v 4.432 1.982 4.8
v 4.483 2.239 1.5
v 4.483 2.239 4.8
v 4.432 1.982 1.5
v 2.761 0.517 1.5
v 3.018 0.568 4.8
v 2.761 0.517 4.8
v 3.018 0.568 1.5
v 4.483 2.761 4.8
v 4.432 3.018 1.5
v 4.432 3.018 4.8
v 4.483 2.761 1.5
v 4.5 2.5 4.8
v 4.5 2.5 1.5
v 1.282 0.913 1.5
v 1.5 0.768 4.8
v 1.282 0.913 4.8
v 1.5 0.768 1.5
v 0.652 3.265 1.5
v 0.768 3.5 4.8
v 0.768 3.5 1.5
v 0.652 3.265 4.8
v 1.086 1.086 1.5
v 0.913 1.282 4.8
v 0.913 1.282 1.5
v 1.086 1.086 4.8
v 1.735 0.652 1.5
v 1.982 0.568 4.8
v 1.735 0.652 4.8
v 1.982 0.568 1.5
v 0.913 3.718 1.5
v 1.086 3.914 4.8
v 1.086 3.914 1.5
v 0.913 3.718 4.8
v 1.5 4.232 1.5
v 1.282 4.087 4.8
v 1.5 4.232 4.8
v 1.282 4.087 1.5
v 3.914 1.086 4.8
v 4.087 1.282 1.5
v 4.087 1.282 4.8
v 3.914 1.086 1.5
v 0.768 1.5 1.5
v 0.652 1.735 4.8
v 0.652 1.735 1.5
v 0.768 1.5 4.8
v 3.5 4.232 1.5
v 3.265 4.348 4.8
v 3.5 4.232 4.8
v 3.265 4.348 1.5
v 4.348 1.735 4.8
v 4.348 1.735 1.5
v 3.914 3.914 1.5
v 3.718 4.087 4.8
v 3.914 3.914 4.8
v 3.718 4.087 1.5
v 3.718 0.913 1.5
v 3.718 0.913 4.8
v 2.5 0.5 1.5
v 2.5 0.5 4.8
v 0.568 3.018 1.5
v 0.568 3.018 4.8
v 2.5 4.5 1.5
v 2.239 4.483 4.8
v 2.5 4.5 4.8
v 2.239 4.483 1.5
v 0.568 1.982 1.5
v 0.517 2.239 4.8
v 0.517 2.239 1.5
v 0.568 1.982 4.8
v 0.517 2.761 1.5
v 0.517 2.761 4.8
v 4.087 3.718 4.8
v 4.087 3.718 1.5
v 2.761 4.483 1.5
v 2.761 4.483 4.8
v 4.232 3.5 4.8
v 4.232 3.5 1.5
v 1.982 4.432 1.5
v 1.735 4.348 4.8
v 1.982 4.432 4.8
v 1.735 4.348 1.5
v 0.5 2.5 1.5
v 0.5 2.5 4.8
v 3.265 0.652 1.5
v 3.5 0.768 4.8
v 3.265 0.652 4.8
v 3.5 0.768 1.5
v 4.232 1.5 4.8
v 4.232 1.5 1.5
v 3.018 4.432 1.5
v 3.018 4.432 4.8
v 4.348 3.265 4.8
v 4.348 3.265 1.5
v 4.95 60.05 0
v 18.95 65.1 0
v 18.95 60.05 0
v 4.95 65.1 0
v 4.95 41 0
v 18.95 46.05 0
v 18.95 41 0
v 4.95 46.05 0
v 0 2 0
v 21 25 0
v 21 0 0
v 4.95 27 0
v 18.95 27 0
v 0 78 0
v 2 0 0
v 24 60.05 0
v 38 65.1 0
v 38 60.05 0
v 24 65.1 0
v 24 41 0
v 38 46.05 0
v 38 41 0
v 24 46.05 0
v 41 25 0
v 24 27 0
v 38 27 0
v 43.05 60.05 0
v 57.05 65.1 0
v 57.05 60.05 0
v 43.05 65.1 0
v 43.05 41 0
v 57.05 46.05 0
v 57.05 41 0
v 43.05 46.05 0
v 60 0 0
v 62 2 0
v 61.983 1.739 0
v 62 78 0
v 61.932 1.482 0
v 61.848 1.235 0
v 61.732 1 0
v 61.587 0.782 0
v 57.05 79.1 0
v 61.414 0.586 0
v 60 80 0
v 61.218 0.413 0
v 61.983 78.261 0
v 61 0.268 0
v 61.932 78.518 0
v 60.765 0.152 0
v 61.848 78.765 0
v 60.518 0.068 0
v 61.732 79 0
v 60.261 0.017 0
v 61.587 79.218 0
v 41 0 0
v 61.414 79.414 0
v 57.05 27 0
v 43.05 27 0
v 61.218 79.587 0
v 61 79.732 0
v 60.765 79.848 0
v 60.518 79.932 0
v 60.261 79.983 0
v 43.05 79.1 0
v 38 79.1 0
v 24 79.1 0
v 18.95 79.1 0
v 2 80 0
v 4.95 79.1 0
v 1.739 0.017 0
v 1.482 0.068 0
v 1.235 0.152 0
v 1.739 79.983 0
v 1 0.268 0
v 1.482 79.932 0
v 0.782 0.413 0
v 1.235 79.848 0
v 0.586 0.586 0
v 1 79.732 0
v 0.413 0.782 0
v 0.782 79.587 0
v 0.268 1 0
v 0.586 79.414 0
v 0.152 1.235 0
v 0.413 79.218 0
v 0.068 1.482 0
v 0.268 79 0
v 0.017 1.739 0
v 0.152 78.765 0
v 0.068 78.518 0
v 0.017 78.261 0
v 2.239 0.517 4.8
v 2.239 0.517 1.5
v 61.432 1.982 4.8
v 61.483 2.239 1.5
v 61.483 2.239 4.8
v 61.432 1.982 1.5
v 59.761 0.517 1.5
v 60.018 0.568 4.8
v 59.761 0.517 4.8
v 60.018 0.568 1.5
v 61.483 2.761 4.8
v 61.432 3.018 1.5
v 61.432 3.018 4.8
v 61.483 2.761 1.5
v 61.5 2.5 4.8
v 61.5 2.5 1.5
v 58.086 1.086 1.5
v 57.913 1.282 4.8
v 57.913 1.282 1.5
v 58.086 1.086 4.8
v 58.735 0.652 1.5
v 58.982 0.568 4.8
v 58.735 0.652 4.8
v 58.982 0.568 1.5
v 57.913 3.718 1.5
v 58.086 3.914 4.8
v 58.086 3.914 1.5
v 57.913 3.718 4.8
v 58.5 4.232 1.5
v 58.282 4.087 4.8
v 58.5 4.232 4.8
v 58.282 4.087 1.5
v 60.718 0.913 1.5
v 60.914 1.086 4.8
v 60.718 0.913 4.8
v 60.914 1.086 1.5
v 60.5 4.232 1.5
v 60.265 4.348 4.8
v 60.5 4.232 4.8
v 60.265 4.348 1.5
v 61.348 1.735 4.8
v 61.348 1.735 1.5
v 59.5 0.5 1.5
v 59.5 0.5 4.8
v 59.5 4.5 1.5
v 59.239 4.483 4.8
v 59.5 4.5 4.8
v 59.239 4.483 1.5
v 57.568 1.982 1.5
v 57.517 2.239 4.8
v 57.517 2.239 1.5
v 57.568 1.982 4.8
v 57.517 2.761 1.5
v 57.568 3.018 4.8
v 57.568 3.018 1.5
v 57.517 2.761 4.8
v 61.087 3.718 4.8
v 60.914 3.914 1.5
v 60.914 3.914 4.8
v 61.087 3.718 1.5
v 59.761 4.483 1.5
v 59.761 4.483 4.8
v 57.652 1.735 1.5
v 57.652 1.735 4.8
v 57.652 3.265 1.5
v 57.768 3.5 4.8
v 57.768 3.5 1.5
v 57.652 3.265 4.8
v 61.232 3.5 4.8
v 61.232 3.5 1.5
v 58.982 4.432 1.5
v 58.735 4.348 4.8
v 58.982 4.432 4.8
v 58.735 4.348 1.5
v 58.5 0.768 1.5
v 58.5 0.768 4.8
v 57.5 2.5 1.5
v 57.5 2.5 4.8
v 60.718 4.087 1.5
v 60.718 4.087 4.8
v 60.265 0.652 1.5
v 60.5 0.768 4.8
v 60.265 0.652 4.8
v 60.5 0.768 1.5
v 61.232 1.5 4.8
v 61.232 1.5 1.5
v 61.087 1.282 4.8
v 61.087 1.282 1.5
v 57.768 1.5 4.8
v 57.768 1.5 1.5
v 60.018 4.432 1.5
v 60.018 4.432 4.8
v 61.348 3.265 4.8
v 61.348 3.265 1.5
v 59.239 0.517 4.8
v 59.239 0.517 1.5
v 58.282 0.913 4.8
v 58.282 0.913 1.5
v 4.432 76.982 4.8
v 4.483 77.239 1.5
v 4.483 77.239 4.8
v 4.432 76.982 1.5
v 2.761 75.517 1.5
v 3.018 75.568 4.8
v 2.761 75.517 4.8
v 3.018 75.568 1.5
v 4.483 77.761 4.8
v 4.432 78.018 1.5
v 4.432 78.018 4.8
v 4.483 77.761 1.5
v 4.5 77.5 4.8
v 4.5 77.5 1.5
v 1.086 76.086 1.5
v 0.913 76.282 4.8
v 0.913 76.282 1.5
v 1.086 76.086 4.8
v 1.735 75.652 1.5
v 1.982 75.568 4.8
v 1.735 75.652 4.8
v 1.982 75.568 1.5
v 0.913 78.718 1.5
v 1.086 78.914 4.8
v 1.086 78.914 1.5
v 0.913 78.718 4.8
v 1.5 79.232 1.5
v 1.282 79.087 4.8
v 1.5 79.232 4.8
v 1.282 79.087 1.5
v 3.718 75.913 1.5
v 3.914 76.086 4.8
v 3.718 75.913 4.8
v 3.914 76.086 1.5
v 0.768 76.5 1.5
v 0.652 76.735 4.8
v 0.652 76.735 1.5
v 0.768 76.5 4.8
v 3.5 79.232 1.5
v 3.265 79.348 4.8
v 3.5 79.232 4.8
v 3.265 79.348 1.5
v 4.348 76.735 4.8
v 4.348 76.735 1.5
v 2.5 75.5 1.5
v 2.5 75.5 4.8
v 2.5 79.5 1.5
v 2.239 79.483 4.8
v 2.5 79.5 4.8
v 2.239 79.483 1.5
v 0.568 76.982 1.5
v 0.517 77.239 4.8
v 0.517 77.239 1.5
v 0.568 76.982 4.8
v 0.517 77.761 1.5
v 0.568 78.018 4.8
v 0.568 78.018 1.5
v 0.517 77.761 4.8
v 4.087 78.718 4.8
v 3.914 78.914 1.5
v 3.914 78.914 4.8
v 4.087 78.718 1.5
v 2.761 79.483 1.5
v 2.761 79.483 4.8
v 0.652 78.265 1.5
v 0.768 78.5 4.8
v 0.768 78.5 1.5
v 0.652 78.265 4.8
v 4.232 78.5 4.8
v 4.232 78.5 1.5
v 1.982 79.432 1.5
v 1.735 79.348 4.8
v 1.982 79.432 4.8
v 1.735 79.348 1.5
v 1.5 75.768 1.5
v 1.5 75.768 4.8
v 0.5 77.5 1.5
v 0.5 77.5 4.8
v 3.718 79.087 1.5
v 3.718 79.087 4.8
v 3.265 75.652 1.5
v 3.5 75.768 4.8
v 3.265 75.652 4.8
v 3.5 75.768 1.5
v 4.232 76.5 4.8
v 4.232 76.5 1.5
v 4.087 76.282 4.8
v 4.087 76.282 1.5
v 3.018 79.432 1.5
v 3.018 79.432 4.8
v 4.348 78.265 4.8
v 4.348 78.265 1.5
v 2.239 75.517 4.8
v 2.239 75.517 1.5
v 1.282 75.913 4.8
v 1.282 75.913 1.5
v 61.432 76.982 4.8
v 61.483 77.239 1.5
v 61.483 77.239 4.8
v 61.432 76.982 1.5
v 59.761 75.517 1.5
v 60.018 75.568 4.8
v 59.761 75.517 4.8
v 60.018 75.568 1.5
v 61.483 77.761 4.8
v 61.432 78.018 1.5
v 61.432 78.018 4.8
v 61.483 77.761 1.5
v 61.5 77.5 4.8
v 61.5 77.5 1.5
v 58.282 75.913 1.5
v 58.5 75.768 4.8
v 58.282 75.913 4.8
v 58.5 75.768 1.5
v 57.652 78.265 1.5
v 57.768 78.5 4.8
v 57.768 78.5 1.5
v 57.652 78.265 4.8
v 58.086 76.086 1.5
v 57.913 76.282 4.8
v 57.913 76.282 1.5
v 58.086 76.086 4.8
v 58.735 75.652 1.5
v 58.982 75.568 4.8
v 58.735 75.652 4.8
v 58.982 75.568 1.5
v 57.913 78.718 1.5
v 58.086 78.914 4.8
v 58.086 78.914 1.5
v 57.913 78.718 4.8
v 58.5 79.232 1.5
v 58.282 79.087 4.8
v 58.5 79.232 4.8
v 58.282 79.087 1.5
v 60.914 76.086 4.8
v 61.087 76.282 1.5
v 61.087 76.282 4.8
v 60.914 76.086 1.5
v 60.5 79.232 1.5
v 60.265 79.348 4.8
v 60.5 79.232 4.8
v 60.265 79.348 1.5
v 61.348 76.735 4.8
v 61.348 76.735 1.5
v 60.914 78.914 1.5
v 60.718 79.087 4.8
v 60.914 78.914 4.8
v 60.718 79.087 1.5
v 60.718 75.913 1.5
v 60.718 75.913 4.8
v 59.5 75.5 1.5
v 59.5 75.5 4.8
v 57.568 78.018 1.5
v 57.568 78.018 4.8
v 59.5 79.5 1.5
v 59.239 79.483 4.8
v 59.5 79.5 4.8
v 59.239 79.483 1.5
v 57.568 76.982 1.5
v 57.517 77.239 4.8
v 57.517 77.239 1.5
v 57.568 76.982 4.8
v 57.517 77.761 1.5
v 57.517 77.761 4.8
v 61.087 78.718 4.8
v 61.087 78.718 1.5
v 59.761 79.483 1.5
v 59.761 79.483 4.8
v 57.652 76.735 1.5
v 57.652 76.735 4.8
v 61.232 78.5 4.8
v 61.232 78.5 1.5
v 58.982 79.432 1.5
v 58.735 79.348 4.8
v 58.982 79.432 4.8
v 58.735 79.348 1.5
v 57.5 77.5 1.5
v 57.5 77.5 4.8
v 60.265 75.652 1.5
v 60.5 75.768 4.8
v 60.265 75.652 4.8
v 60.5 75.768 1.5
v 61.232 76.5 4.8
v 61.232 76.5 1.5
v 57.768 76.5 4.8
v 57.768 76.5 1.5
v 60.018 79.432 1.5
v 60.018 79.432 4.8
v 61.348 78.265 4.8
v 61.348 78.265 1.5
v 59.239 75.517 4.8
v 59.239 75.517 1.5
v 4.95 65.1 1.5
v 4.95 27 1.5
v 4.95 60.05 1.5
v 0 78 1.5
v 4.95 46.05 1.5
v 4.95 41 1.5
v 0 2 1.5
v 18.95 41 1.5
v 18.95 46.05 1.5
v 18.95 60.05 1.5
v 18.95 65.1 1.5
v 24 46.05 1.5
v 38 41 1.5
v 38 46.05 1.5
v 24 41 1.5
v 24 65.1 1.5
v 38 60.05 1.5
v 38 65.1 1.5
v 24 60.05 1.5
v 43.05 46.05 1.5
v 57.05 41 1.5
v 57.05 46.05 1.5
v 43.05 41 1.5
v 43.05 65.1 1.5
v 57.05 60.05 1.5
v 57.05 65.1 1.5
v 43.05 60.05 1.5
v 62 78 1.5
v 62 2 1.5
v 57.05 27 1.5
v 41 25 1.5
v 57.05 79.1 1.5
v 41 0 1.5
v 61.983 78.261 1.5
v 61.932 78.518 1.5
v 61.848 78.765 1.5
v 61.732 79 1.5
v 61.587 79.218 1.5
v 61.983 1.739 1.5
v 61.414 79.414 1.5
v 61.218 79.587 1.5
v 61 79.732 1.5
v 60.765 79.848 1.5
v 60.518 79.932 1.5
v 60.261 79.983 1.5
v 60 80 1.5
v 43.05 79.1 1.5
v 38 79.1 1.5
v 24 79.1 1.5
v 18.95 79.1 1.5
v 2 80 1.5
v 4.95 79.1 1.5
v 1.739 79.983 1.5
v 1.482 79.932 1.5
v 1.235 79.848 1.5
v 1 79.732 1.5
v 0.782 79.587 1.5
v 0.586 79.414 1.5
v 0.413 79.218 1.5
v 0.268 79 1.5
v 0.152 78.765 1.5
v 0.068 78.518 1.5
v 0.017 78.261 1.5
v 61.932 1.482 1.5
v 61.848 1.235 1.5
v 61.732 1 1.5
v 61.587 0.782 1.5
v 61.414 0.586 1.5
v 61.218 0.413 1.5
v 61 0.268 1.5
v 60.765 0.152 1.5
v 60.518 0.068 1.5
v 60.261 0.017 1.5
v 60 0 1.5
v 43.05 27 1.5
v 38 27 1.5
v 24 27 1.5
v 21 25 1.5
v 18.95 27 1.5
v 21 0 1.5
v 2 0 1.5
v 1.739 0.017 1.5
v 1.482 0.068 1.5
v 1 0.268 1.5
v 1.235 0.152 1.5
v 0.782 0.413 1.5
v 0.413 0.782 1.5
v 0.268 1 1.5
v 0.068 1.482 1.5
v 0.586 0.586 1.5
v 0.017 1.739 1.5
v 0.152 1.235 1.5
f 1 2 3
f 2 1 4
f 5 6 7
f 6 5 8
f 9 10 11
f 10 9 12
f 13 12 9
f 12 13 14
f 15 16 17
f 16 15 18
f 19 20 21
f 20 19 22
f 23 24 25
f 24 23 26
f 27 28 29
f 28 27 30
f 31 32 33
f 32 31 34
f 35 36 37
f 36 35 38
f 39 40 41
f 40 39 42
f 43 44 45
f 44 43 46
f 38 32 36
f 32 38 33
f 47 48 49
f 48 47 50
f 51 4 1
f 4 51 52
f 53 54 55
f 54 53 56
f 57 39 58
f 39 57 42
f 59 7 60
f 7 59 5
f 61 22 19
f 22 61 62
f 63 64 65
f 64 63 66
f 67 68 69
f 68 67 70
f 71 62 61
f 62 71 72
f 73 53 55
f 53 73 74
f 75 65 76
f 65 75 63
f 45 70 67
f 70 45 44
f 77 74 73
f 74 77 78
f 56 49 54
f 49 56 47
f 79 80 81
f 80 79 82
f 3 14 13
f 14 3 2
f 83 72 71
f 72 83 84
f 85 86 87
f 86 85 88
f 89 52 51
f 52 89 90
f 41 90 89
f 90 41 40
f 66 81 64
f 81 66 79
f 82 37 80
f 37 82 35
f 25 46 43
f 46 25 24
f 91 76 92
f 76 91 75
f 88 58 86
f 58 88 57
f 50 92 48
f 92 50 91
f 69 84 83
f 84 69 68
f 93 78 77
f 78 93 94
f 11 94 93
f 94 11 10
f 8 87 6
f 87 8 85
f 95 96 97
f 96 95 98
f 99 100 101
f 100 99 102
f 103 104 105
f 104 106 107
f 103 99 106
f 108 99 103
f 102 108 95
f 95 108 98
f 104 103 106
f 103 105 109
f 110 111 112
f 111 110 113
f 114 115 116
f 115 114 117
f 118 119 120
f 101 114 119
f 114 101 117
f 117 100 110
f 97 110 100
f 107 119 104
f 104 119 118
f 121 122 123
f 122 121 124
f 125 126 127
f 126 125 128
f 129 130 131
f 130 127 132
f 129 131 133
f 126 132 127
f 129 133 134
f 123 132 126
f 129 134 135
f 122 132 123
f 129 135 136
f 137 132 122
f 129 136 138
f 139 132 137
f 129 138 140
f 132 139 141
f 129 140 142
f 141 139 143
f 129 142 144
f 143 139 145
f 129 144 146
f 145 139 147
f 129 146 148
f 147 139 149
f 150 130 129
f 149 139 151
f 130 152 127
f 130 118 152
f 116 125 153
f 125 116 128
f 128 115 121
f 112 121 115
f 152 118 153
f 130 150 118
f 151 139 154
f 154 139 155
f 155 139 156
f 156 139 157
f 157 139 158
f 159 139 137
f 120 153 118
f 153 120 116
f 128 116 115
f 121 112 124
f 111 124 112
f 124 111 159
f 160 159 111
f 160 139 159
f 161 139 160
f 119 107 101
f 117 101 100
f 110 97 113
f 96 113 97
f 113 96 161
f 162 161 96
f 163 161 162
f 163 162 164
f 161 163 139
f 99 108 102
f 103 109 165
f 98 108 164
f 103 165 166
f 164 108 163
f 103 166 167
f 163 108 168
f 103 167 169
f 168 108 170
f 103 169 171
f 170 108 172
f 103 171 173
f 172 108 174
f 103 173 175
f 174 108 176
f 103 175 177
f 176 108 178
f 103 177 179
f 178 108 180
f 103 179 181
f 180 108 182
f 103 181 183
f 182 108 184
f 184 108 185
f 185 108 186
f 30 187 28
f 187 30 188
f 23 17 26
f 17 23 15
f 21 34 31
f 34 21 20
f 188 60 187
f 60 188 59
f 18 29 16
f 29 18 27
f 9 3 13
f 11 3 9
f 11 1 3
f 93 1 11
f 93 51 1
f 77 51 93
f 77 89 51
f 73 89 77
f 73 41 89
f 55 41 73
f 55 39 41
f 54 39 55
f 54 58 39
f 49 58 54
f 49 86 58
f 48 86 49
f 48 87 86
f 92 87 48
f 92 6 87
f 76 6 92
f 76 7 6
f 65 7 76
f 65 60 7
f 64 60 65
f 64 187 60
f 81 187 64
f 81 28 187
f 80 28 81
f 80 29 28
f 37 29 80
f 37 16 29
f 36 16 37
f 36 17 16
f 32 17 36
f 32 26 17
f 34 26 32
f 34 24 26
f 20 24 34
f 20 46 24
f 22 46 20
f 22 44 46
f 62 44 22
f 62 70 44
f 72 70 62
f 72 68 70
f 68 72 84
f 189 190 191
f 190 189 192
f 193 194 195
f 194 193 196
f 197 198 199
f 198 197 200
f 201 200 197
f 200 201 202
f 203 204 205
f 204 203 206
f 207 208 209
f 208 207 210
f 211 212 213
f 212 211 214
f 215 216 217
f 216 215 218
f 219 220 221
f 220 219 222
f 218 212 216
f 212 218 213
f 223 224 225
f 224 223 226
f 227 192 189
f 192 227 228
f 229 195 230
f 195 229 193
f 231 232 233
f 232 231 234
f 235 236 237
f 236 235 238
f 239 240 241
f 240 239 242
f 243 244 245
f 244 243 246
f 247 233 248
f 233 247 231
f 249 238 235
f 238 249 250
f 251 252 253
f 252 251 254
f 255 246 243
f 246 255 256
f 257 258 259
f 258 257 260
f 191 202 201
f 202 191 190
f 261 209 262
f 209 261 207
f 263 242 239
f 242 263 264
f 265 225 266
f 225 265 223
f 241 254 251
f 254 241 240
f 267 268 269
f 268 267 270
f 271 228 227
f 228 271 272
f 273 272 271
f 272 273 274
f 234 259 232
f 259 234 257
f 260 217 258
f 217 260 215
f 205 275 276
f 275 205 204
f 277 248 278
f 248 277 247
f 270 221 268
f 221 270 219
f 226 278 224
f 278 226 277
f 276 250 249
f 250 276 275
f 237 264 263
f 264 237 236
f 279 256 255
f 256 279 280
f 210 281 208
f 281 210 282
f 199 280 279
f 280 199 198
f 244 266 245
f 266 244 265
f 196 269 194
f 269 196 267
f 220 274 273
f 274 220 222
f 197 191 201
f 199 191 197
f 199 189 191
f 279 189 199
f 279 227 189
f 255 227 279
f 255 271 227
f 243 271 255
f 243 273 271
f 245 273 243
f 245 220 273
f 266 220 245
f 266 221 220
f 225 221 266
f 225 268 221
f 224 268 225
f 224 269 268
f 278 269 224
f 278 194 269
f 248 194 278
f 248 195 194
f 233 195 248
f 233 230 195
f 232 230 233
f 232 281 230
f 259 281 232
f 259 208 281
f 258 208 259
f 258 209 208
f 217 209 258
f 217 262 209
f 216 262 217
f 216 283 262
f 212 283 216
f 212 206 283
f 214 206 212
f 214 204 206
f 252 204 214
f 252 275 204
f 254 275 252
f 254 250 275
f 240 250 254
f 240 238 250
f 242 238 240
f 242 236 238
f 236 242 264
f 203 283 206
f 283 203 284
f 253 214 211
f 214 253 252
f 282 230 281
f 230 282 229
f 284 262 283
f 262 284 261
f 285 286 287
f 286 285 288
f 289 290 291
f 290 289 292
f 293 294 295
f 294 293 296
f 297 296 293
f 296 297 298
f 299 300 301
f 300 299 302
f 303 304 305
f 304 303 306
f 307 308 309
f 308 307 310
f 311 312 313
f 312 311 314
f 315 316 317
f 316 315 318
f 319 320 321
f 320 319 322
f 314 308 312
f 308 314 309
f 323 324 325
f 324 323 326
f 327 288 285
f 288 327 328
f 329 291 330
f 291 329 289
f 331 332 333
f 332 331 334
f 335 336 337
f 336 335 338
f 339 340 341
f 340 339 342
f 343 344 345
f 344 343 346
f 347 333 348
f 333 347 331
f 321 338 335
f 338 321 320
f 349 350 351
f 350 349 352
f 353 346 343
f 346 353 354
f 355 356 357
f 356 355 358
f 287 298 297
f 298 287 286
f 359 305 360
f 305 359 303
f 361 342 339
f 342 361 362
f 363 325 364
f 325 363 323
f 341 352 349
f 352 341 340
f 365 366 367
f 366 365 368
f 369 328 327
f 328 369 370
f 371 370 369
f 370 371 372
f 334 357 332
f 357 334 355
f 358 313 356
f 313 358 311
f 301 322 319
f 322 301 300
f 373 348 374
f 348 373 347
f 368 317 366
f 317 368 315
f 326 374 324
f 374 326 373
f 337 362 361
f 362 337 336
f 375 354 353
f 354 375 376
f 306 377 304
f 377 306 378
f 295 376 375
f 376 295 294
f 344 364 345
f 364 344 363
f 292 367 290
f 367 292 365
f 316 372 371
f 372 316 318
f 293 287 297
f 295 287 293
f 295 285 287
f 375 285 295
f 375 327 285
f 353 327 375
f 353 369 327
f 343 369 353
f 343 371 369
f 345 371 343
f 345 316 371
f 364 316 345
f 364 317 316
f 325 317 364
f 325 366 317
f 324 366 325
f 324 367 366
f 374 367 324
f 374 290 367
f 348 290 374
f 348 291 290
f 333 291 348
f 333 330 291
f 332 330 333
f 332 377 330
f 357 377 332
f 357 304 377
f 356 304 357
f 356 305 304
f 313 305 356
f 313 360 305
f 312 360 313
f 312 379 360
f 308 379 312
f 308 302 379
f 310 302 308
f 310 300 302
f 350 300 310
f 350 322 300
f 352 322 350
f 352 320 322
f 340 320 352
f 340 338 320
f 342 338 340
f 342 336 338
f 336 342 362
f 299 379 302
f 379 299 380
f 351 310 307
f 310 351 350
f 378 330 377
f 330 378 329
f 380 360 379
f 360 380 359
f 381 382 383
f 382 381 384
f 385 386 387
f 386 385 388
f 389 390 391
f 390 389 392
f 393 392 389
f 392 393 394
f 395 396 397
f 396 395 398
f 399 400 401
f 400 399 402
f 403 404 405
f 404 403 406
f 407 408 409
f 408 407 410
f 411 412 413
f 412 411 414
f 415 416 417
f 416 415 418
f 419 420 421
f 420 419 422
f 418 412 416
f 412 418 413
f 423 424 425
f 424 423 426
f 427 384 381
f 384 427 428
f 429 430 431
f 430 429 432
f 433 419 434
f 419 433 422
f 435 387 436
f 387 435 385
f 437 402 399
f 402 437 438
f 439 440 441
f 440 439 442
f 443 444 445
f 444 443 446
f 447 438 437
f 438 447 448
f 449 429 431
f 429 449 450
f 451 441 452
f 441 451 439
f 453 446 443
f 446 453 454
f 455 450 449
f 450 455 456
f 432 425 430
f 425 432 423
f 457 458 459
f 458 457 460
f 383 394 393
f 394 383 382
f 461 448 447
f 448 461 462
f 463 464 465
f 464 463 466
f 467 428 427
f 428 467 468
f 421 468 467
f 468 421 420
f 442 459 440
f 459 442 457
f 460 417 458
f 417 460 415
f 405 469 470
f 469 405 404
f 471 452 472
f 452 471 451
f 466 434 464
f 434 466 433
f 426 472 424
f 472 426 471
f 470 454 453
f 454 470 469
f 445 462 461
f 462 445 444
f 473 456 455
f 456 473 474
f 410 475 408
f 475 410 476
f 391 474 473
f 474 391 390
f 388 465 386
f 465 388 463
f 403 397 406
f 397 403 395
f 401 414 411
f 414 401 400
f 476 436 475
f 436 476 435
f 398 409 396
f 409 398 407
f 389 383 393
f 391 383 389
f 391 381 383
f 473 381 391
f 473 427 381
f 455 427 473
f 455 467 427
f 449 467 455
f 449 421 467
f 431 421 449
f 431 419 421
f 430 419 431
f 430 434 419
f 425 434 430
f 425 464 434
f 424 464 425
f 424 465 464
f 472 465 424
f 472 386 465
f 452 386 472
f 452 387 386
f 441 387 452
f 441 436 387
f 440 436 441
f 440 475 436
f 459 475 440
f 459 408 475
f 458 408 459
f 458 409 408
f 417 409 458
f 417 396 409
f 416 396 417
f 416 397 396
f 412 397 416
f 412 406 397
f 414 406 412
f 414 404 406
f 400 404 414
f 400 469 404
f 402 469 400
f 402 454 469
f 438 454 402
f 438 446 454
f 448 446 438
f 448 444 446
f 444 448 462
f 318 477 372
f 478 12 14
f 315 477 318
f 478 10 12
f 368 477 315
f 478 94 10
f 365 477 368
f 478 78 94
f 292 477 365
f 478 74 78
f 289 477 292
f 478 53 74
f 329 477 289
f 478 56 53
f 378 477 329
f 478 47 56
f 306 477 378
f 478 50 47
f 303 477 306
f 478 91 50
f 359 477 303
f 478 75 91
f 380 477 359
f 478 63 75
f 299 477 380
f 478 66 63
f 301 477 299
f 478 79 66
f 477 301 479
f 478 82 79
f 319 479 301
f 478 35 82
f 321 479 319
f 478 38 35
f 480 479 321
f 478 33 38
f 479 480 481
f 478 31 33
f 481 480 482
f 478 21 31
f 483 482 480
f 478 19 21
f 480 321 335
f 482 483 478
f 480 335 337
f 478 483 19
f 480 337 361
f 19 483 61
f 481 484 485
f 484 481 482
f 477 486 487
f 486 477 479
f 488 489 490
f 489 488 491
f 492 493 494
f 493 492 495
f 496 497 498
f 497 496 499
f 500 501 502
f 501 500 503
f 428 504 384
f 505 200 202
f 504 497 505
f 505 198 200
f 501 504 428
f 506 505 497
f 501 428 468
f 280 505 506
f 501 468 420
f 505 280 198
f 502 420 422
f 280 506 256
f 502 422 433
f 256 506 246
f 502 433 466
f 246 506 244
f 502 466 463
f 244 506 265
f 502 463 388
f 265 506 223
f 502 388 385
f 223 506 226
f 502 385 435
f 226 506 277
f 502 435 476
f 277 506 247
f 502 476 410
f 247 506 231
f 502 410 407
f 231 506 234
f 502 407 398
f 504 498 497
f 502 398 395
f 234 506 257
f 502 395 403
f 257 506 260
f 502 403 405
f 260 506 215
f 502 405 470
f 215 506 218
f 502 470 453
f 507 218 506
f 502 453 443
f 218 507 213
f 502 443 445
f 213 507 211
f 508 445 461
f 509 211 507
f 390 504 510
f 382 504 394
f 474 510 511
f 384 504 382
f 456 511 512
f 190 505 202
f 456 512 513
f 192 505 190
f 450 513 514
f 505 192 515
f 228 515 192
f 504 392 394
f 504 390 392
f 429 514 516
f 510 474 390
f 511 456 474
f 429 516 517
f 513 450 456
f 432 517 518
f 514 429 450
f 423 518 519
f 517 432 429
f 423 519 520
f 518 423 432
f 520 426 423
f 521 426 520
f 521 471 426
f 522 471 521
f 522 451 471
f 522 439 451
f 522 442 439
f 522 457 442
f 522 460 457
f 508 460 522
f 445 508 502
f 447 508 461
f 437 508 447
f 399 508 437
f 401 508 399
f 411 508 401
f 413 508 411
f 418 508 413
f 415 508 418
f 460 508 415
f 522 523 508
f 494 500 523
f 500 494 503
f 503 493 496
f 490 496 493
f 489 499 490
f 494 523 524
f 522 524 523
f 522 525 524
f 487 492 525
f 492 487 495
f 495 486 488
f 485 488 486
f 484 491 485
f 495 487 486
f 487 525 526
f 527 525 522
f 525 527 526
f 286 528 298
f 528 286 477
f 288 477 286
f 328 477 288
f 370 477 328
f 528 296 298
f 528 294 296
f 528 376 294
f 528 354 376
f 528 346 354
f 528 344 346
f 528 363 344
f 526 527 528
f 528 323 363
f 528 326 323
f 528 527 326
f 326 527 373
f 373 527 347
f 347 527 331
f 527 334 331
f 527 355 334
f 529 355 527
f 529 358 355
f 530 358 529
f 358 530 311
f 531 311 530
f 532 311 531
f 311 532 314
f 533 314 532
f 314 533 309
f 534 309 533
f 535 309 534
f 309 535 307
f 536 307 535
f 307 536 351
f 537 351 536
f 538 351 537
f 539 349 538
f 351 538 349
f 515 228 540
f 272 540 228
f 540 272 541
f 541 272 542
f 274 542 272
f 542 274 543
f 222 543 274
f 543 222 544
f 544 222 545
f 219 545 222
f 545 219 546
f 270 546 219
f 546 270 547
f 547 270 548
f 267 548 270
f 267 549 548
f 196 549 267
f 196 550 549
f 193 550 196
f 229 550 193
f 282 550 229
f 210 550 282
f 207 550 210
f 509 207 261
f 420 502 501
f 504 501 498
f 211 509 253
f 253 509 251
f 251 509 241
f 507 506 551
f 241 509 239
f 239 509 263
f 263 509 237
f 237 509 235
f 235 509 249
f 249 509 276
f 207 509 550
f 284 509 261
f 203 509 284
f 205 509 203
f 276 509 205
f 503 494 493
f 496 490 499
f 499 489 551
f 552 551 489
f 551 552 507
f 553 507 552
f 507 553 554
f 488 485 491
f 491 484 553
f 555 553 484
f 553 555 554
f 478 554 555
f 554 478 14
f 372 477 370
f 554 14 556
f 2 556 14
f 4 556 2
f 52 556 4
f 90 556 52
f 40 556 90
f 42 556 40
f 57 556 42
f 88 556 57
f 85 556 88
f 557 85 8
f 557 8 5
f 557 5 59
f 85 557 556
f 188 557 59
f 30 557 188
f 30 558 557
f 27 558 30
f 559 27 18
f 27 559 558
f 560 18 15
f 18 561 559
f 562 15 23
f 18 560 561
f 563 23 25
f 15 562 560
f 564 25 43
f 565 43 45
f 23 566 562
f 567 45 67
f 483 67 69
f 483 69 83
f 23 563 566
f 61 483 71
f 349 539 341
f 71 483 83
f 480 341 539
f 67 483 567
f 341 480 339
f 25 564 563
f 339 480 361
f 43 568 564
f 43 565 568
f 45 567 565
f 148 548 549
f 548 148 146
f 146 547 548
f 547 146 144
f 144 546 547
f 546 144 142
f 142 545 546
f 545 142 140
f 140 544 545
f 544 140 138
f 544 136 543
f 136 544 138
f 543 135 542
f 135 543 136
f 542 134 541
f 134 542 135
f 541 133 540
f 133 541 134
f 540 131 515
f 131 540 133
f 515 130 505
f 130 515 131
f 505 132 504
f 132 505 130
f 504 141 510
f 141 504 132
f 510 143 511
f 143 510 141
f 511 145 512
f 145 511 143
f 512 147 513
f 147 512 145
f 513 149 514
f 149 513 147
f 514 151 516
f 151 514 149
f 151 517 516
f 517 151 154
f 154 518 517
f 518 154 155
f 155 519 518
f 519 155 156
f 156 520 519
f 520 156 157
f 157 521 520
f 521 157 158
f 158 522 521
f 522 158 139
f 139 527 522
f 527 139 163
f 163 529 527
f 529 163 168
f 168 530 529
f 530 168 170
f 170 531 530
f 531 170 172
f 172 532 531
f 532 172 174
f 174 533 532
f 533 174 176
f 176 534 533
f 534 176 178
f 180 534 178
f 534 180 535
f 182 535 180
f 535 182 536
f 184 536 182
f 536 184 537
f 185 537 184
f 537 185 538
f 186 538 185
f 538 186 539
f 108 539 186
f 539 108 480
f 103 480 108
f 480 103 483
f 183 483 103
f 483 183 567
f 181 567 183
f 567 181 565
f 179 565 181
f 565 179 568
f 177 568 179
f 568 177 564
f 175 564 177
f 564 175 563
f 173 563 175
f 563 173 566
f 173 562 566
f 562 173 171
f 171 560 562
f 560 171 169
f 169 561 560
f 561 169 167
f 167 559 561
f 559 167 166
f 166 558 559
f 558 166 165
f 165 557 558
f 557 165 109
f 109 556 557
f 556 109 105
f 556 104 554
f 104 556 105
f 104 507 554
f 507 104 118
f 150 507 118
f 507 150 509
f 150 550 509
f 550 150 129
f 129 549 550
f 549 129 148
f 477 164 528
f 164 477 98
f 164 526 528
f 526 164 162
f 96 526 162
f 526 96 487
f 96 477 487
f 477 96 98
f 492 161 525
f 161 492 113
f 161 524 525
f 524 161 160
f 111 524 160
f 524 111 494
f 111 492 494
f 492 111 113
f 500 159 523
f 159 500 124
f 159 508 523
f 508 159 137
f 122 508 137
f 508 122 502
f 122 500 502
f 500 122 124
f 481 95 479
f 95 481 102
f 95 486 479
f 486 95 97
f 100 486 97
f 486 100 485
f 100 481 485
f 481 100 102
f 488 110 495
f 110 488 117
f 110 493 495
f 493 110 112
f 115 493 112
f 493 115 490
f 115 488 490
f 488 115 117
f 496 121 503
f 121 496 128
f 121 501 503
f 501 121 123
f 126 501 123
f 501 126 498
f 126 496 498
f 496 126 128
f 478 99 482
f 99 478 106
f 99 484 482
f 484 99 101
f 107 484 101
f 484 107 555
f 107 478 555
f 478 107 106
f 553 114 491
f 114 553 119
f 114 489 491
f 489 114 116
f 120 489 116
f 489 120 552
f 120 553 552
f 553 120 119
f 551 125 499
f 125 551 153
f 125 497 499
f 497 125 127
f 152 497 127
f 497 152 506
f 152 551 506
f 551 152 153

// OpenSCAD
// Rev2 キー保持プレート（ねじ止めなし）
// スイッチをソケットへ挿して保持する。四隅の柱は傾き止めで、基板とは standoff_gap だけ離す。
// 印刷向き: z=0 が指側の上面。上面をビルドプレートに置き、柱が上に伸びる向きでサポートなし印刷。
// 座標は PCB 座標（左上原点・下向き+y）をそのまま使う。印刷姿勢からX軸回りに裏返すと実装向きになる。
part = "plate"; // [plate, fit_test]

plate_thickness = 1.5;
switch_opening = 14.0; // fit_test の結果で調整する
plate_top_above_pcb = 5.0; // PCB表面からプレート上面まで
standoff_gap = 0.2; // スイッチのクリップ位置と競合させない
standoff_diameter = 4.0; // 基板の銅箔禁止領域 Ø5 以内
$fn = 48;

mount_holes = [[2.5, 2.5], [59.5, 2.5], [2.5, 77.5], [59.5, 77.5]];

module profile() {
    hull() {
        for (x = [2, 60]) for (y = [2, 78])
            translate([x, y]) circle(r=2);
    }
}

module plate() {
    linear_extrude(height=plate_thickness) difference() {
        profile();
        translate([21, -1]) square([20, 26]); // MCU/USB access.
        for (row = [0:2]) for (col = [0:2]) {
            // Lower-right opening clears the EC11 body.
            translate([11.95 + col*19.05, 34 + row*19.05])
                square([switch_opening, switch_opening], center=true);
        }
    }
    for (p = mount_holes)
        translate(p) cylinder(d=standoff_diameter, h=plate_top_above_pcb - standoff_gap);
}

// 開口 13.9 / 14.0 / 14.1 mm の嵌合テスト。開口の左側の切り欠き数が 1 / 2 / 3。
module fit_test() {
    sizes = [13.9, 14.0, 14.1];
    linear_extrude(height=plate_thickness) difference() {
        square([3*19.05, 19.05]);
        for (i = [0:2]) {
            translate([19.05*(i + 0.5), 19.05/2])
                square([sizes[i], sizes[i]], center=true);
            for (n = [0:i])
                translate([19.05*i + 0.4 + n*0.9, -0.01]) square([0.5, 1.2]);
        }
    }
}

if (part == "fit_test") fit_test();
else plate();
